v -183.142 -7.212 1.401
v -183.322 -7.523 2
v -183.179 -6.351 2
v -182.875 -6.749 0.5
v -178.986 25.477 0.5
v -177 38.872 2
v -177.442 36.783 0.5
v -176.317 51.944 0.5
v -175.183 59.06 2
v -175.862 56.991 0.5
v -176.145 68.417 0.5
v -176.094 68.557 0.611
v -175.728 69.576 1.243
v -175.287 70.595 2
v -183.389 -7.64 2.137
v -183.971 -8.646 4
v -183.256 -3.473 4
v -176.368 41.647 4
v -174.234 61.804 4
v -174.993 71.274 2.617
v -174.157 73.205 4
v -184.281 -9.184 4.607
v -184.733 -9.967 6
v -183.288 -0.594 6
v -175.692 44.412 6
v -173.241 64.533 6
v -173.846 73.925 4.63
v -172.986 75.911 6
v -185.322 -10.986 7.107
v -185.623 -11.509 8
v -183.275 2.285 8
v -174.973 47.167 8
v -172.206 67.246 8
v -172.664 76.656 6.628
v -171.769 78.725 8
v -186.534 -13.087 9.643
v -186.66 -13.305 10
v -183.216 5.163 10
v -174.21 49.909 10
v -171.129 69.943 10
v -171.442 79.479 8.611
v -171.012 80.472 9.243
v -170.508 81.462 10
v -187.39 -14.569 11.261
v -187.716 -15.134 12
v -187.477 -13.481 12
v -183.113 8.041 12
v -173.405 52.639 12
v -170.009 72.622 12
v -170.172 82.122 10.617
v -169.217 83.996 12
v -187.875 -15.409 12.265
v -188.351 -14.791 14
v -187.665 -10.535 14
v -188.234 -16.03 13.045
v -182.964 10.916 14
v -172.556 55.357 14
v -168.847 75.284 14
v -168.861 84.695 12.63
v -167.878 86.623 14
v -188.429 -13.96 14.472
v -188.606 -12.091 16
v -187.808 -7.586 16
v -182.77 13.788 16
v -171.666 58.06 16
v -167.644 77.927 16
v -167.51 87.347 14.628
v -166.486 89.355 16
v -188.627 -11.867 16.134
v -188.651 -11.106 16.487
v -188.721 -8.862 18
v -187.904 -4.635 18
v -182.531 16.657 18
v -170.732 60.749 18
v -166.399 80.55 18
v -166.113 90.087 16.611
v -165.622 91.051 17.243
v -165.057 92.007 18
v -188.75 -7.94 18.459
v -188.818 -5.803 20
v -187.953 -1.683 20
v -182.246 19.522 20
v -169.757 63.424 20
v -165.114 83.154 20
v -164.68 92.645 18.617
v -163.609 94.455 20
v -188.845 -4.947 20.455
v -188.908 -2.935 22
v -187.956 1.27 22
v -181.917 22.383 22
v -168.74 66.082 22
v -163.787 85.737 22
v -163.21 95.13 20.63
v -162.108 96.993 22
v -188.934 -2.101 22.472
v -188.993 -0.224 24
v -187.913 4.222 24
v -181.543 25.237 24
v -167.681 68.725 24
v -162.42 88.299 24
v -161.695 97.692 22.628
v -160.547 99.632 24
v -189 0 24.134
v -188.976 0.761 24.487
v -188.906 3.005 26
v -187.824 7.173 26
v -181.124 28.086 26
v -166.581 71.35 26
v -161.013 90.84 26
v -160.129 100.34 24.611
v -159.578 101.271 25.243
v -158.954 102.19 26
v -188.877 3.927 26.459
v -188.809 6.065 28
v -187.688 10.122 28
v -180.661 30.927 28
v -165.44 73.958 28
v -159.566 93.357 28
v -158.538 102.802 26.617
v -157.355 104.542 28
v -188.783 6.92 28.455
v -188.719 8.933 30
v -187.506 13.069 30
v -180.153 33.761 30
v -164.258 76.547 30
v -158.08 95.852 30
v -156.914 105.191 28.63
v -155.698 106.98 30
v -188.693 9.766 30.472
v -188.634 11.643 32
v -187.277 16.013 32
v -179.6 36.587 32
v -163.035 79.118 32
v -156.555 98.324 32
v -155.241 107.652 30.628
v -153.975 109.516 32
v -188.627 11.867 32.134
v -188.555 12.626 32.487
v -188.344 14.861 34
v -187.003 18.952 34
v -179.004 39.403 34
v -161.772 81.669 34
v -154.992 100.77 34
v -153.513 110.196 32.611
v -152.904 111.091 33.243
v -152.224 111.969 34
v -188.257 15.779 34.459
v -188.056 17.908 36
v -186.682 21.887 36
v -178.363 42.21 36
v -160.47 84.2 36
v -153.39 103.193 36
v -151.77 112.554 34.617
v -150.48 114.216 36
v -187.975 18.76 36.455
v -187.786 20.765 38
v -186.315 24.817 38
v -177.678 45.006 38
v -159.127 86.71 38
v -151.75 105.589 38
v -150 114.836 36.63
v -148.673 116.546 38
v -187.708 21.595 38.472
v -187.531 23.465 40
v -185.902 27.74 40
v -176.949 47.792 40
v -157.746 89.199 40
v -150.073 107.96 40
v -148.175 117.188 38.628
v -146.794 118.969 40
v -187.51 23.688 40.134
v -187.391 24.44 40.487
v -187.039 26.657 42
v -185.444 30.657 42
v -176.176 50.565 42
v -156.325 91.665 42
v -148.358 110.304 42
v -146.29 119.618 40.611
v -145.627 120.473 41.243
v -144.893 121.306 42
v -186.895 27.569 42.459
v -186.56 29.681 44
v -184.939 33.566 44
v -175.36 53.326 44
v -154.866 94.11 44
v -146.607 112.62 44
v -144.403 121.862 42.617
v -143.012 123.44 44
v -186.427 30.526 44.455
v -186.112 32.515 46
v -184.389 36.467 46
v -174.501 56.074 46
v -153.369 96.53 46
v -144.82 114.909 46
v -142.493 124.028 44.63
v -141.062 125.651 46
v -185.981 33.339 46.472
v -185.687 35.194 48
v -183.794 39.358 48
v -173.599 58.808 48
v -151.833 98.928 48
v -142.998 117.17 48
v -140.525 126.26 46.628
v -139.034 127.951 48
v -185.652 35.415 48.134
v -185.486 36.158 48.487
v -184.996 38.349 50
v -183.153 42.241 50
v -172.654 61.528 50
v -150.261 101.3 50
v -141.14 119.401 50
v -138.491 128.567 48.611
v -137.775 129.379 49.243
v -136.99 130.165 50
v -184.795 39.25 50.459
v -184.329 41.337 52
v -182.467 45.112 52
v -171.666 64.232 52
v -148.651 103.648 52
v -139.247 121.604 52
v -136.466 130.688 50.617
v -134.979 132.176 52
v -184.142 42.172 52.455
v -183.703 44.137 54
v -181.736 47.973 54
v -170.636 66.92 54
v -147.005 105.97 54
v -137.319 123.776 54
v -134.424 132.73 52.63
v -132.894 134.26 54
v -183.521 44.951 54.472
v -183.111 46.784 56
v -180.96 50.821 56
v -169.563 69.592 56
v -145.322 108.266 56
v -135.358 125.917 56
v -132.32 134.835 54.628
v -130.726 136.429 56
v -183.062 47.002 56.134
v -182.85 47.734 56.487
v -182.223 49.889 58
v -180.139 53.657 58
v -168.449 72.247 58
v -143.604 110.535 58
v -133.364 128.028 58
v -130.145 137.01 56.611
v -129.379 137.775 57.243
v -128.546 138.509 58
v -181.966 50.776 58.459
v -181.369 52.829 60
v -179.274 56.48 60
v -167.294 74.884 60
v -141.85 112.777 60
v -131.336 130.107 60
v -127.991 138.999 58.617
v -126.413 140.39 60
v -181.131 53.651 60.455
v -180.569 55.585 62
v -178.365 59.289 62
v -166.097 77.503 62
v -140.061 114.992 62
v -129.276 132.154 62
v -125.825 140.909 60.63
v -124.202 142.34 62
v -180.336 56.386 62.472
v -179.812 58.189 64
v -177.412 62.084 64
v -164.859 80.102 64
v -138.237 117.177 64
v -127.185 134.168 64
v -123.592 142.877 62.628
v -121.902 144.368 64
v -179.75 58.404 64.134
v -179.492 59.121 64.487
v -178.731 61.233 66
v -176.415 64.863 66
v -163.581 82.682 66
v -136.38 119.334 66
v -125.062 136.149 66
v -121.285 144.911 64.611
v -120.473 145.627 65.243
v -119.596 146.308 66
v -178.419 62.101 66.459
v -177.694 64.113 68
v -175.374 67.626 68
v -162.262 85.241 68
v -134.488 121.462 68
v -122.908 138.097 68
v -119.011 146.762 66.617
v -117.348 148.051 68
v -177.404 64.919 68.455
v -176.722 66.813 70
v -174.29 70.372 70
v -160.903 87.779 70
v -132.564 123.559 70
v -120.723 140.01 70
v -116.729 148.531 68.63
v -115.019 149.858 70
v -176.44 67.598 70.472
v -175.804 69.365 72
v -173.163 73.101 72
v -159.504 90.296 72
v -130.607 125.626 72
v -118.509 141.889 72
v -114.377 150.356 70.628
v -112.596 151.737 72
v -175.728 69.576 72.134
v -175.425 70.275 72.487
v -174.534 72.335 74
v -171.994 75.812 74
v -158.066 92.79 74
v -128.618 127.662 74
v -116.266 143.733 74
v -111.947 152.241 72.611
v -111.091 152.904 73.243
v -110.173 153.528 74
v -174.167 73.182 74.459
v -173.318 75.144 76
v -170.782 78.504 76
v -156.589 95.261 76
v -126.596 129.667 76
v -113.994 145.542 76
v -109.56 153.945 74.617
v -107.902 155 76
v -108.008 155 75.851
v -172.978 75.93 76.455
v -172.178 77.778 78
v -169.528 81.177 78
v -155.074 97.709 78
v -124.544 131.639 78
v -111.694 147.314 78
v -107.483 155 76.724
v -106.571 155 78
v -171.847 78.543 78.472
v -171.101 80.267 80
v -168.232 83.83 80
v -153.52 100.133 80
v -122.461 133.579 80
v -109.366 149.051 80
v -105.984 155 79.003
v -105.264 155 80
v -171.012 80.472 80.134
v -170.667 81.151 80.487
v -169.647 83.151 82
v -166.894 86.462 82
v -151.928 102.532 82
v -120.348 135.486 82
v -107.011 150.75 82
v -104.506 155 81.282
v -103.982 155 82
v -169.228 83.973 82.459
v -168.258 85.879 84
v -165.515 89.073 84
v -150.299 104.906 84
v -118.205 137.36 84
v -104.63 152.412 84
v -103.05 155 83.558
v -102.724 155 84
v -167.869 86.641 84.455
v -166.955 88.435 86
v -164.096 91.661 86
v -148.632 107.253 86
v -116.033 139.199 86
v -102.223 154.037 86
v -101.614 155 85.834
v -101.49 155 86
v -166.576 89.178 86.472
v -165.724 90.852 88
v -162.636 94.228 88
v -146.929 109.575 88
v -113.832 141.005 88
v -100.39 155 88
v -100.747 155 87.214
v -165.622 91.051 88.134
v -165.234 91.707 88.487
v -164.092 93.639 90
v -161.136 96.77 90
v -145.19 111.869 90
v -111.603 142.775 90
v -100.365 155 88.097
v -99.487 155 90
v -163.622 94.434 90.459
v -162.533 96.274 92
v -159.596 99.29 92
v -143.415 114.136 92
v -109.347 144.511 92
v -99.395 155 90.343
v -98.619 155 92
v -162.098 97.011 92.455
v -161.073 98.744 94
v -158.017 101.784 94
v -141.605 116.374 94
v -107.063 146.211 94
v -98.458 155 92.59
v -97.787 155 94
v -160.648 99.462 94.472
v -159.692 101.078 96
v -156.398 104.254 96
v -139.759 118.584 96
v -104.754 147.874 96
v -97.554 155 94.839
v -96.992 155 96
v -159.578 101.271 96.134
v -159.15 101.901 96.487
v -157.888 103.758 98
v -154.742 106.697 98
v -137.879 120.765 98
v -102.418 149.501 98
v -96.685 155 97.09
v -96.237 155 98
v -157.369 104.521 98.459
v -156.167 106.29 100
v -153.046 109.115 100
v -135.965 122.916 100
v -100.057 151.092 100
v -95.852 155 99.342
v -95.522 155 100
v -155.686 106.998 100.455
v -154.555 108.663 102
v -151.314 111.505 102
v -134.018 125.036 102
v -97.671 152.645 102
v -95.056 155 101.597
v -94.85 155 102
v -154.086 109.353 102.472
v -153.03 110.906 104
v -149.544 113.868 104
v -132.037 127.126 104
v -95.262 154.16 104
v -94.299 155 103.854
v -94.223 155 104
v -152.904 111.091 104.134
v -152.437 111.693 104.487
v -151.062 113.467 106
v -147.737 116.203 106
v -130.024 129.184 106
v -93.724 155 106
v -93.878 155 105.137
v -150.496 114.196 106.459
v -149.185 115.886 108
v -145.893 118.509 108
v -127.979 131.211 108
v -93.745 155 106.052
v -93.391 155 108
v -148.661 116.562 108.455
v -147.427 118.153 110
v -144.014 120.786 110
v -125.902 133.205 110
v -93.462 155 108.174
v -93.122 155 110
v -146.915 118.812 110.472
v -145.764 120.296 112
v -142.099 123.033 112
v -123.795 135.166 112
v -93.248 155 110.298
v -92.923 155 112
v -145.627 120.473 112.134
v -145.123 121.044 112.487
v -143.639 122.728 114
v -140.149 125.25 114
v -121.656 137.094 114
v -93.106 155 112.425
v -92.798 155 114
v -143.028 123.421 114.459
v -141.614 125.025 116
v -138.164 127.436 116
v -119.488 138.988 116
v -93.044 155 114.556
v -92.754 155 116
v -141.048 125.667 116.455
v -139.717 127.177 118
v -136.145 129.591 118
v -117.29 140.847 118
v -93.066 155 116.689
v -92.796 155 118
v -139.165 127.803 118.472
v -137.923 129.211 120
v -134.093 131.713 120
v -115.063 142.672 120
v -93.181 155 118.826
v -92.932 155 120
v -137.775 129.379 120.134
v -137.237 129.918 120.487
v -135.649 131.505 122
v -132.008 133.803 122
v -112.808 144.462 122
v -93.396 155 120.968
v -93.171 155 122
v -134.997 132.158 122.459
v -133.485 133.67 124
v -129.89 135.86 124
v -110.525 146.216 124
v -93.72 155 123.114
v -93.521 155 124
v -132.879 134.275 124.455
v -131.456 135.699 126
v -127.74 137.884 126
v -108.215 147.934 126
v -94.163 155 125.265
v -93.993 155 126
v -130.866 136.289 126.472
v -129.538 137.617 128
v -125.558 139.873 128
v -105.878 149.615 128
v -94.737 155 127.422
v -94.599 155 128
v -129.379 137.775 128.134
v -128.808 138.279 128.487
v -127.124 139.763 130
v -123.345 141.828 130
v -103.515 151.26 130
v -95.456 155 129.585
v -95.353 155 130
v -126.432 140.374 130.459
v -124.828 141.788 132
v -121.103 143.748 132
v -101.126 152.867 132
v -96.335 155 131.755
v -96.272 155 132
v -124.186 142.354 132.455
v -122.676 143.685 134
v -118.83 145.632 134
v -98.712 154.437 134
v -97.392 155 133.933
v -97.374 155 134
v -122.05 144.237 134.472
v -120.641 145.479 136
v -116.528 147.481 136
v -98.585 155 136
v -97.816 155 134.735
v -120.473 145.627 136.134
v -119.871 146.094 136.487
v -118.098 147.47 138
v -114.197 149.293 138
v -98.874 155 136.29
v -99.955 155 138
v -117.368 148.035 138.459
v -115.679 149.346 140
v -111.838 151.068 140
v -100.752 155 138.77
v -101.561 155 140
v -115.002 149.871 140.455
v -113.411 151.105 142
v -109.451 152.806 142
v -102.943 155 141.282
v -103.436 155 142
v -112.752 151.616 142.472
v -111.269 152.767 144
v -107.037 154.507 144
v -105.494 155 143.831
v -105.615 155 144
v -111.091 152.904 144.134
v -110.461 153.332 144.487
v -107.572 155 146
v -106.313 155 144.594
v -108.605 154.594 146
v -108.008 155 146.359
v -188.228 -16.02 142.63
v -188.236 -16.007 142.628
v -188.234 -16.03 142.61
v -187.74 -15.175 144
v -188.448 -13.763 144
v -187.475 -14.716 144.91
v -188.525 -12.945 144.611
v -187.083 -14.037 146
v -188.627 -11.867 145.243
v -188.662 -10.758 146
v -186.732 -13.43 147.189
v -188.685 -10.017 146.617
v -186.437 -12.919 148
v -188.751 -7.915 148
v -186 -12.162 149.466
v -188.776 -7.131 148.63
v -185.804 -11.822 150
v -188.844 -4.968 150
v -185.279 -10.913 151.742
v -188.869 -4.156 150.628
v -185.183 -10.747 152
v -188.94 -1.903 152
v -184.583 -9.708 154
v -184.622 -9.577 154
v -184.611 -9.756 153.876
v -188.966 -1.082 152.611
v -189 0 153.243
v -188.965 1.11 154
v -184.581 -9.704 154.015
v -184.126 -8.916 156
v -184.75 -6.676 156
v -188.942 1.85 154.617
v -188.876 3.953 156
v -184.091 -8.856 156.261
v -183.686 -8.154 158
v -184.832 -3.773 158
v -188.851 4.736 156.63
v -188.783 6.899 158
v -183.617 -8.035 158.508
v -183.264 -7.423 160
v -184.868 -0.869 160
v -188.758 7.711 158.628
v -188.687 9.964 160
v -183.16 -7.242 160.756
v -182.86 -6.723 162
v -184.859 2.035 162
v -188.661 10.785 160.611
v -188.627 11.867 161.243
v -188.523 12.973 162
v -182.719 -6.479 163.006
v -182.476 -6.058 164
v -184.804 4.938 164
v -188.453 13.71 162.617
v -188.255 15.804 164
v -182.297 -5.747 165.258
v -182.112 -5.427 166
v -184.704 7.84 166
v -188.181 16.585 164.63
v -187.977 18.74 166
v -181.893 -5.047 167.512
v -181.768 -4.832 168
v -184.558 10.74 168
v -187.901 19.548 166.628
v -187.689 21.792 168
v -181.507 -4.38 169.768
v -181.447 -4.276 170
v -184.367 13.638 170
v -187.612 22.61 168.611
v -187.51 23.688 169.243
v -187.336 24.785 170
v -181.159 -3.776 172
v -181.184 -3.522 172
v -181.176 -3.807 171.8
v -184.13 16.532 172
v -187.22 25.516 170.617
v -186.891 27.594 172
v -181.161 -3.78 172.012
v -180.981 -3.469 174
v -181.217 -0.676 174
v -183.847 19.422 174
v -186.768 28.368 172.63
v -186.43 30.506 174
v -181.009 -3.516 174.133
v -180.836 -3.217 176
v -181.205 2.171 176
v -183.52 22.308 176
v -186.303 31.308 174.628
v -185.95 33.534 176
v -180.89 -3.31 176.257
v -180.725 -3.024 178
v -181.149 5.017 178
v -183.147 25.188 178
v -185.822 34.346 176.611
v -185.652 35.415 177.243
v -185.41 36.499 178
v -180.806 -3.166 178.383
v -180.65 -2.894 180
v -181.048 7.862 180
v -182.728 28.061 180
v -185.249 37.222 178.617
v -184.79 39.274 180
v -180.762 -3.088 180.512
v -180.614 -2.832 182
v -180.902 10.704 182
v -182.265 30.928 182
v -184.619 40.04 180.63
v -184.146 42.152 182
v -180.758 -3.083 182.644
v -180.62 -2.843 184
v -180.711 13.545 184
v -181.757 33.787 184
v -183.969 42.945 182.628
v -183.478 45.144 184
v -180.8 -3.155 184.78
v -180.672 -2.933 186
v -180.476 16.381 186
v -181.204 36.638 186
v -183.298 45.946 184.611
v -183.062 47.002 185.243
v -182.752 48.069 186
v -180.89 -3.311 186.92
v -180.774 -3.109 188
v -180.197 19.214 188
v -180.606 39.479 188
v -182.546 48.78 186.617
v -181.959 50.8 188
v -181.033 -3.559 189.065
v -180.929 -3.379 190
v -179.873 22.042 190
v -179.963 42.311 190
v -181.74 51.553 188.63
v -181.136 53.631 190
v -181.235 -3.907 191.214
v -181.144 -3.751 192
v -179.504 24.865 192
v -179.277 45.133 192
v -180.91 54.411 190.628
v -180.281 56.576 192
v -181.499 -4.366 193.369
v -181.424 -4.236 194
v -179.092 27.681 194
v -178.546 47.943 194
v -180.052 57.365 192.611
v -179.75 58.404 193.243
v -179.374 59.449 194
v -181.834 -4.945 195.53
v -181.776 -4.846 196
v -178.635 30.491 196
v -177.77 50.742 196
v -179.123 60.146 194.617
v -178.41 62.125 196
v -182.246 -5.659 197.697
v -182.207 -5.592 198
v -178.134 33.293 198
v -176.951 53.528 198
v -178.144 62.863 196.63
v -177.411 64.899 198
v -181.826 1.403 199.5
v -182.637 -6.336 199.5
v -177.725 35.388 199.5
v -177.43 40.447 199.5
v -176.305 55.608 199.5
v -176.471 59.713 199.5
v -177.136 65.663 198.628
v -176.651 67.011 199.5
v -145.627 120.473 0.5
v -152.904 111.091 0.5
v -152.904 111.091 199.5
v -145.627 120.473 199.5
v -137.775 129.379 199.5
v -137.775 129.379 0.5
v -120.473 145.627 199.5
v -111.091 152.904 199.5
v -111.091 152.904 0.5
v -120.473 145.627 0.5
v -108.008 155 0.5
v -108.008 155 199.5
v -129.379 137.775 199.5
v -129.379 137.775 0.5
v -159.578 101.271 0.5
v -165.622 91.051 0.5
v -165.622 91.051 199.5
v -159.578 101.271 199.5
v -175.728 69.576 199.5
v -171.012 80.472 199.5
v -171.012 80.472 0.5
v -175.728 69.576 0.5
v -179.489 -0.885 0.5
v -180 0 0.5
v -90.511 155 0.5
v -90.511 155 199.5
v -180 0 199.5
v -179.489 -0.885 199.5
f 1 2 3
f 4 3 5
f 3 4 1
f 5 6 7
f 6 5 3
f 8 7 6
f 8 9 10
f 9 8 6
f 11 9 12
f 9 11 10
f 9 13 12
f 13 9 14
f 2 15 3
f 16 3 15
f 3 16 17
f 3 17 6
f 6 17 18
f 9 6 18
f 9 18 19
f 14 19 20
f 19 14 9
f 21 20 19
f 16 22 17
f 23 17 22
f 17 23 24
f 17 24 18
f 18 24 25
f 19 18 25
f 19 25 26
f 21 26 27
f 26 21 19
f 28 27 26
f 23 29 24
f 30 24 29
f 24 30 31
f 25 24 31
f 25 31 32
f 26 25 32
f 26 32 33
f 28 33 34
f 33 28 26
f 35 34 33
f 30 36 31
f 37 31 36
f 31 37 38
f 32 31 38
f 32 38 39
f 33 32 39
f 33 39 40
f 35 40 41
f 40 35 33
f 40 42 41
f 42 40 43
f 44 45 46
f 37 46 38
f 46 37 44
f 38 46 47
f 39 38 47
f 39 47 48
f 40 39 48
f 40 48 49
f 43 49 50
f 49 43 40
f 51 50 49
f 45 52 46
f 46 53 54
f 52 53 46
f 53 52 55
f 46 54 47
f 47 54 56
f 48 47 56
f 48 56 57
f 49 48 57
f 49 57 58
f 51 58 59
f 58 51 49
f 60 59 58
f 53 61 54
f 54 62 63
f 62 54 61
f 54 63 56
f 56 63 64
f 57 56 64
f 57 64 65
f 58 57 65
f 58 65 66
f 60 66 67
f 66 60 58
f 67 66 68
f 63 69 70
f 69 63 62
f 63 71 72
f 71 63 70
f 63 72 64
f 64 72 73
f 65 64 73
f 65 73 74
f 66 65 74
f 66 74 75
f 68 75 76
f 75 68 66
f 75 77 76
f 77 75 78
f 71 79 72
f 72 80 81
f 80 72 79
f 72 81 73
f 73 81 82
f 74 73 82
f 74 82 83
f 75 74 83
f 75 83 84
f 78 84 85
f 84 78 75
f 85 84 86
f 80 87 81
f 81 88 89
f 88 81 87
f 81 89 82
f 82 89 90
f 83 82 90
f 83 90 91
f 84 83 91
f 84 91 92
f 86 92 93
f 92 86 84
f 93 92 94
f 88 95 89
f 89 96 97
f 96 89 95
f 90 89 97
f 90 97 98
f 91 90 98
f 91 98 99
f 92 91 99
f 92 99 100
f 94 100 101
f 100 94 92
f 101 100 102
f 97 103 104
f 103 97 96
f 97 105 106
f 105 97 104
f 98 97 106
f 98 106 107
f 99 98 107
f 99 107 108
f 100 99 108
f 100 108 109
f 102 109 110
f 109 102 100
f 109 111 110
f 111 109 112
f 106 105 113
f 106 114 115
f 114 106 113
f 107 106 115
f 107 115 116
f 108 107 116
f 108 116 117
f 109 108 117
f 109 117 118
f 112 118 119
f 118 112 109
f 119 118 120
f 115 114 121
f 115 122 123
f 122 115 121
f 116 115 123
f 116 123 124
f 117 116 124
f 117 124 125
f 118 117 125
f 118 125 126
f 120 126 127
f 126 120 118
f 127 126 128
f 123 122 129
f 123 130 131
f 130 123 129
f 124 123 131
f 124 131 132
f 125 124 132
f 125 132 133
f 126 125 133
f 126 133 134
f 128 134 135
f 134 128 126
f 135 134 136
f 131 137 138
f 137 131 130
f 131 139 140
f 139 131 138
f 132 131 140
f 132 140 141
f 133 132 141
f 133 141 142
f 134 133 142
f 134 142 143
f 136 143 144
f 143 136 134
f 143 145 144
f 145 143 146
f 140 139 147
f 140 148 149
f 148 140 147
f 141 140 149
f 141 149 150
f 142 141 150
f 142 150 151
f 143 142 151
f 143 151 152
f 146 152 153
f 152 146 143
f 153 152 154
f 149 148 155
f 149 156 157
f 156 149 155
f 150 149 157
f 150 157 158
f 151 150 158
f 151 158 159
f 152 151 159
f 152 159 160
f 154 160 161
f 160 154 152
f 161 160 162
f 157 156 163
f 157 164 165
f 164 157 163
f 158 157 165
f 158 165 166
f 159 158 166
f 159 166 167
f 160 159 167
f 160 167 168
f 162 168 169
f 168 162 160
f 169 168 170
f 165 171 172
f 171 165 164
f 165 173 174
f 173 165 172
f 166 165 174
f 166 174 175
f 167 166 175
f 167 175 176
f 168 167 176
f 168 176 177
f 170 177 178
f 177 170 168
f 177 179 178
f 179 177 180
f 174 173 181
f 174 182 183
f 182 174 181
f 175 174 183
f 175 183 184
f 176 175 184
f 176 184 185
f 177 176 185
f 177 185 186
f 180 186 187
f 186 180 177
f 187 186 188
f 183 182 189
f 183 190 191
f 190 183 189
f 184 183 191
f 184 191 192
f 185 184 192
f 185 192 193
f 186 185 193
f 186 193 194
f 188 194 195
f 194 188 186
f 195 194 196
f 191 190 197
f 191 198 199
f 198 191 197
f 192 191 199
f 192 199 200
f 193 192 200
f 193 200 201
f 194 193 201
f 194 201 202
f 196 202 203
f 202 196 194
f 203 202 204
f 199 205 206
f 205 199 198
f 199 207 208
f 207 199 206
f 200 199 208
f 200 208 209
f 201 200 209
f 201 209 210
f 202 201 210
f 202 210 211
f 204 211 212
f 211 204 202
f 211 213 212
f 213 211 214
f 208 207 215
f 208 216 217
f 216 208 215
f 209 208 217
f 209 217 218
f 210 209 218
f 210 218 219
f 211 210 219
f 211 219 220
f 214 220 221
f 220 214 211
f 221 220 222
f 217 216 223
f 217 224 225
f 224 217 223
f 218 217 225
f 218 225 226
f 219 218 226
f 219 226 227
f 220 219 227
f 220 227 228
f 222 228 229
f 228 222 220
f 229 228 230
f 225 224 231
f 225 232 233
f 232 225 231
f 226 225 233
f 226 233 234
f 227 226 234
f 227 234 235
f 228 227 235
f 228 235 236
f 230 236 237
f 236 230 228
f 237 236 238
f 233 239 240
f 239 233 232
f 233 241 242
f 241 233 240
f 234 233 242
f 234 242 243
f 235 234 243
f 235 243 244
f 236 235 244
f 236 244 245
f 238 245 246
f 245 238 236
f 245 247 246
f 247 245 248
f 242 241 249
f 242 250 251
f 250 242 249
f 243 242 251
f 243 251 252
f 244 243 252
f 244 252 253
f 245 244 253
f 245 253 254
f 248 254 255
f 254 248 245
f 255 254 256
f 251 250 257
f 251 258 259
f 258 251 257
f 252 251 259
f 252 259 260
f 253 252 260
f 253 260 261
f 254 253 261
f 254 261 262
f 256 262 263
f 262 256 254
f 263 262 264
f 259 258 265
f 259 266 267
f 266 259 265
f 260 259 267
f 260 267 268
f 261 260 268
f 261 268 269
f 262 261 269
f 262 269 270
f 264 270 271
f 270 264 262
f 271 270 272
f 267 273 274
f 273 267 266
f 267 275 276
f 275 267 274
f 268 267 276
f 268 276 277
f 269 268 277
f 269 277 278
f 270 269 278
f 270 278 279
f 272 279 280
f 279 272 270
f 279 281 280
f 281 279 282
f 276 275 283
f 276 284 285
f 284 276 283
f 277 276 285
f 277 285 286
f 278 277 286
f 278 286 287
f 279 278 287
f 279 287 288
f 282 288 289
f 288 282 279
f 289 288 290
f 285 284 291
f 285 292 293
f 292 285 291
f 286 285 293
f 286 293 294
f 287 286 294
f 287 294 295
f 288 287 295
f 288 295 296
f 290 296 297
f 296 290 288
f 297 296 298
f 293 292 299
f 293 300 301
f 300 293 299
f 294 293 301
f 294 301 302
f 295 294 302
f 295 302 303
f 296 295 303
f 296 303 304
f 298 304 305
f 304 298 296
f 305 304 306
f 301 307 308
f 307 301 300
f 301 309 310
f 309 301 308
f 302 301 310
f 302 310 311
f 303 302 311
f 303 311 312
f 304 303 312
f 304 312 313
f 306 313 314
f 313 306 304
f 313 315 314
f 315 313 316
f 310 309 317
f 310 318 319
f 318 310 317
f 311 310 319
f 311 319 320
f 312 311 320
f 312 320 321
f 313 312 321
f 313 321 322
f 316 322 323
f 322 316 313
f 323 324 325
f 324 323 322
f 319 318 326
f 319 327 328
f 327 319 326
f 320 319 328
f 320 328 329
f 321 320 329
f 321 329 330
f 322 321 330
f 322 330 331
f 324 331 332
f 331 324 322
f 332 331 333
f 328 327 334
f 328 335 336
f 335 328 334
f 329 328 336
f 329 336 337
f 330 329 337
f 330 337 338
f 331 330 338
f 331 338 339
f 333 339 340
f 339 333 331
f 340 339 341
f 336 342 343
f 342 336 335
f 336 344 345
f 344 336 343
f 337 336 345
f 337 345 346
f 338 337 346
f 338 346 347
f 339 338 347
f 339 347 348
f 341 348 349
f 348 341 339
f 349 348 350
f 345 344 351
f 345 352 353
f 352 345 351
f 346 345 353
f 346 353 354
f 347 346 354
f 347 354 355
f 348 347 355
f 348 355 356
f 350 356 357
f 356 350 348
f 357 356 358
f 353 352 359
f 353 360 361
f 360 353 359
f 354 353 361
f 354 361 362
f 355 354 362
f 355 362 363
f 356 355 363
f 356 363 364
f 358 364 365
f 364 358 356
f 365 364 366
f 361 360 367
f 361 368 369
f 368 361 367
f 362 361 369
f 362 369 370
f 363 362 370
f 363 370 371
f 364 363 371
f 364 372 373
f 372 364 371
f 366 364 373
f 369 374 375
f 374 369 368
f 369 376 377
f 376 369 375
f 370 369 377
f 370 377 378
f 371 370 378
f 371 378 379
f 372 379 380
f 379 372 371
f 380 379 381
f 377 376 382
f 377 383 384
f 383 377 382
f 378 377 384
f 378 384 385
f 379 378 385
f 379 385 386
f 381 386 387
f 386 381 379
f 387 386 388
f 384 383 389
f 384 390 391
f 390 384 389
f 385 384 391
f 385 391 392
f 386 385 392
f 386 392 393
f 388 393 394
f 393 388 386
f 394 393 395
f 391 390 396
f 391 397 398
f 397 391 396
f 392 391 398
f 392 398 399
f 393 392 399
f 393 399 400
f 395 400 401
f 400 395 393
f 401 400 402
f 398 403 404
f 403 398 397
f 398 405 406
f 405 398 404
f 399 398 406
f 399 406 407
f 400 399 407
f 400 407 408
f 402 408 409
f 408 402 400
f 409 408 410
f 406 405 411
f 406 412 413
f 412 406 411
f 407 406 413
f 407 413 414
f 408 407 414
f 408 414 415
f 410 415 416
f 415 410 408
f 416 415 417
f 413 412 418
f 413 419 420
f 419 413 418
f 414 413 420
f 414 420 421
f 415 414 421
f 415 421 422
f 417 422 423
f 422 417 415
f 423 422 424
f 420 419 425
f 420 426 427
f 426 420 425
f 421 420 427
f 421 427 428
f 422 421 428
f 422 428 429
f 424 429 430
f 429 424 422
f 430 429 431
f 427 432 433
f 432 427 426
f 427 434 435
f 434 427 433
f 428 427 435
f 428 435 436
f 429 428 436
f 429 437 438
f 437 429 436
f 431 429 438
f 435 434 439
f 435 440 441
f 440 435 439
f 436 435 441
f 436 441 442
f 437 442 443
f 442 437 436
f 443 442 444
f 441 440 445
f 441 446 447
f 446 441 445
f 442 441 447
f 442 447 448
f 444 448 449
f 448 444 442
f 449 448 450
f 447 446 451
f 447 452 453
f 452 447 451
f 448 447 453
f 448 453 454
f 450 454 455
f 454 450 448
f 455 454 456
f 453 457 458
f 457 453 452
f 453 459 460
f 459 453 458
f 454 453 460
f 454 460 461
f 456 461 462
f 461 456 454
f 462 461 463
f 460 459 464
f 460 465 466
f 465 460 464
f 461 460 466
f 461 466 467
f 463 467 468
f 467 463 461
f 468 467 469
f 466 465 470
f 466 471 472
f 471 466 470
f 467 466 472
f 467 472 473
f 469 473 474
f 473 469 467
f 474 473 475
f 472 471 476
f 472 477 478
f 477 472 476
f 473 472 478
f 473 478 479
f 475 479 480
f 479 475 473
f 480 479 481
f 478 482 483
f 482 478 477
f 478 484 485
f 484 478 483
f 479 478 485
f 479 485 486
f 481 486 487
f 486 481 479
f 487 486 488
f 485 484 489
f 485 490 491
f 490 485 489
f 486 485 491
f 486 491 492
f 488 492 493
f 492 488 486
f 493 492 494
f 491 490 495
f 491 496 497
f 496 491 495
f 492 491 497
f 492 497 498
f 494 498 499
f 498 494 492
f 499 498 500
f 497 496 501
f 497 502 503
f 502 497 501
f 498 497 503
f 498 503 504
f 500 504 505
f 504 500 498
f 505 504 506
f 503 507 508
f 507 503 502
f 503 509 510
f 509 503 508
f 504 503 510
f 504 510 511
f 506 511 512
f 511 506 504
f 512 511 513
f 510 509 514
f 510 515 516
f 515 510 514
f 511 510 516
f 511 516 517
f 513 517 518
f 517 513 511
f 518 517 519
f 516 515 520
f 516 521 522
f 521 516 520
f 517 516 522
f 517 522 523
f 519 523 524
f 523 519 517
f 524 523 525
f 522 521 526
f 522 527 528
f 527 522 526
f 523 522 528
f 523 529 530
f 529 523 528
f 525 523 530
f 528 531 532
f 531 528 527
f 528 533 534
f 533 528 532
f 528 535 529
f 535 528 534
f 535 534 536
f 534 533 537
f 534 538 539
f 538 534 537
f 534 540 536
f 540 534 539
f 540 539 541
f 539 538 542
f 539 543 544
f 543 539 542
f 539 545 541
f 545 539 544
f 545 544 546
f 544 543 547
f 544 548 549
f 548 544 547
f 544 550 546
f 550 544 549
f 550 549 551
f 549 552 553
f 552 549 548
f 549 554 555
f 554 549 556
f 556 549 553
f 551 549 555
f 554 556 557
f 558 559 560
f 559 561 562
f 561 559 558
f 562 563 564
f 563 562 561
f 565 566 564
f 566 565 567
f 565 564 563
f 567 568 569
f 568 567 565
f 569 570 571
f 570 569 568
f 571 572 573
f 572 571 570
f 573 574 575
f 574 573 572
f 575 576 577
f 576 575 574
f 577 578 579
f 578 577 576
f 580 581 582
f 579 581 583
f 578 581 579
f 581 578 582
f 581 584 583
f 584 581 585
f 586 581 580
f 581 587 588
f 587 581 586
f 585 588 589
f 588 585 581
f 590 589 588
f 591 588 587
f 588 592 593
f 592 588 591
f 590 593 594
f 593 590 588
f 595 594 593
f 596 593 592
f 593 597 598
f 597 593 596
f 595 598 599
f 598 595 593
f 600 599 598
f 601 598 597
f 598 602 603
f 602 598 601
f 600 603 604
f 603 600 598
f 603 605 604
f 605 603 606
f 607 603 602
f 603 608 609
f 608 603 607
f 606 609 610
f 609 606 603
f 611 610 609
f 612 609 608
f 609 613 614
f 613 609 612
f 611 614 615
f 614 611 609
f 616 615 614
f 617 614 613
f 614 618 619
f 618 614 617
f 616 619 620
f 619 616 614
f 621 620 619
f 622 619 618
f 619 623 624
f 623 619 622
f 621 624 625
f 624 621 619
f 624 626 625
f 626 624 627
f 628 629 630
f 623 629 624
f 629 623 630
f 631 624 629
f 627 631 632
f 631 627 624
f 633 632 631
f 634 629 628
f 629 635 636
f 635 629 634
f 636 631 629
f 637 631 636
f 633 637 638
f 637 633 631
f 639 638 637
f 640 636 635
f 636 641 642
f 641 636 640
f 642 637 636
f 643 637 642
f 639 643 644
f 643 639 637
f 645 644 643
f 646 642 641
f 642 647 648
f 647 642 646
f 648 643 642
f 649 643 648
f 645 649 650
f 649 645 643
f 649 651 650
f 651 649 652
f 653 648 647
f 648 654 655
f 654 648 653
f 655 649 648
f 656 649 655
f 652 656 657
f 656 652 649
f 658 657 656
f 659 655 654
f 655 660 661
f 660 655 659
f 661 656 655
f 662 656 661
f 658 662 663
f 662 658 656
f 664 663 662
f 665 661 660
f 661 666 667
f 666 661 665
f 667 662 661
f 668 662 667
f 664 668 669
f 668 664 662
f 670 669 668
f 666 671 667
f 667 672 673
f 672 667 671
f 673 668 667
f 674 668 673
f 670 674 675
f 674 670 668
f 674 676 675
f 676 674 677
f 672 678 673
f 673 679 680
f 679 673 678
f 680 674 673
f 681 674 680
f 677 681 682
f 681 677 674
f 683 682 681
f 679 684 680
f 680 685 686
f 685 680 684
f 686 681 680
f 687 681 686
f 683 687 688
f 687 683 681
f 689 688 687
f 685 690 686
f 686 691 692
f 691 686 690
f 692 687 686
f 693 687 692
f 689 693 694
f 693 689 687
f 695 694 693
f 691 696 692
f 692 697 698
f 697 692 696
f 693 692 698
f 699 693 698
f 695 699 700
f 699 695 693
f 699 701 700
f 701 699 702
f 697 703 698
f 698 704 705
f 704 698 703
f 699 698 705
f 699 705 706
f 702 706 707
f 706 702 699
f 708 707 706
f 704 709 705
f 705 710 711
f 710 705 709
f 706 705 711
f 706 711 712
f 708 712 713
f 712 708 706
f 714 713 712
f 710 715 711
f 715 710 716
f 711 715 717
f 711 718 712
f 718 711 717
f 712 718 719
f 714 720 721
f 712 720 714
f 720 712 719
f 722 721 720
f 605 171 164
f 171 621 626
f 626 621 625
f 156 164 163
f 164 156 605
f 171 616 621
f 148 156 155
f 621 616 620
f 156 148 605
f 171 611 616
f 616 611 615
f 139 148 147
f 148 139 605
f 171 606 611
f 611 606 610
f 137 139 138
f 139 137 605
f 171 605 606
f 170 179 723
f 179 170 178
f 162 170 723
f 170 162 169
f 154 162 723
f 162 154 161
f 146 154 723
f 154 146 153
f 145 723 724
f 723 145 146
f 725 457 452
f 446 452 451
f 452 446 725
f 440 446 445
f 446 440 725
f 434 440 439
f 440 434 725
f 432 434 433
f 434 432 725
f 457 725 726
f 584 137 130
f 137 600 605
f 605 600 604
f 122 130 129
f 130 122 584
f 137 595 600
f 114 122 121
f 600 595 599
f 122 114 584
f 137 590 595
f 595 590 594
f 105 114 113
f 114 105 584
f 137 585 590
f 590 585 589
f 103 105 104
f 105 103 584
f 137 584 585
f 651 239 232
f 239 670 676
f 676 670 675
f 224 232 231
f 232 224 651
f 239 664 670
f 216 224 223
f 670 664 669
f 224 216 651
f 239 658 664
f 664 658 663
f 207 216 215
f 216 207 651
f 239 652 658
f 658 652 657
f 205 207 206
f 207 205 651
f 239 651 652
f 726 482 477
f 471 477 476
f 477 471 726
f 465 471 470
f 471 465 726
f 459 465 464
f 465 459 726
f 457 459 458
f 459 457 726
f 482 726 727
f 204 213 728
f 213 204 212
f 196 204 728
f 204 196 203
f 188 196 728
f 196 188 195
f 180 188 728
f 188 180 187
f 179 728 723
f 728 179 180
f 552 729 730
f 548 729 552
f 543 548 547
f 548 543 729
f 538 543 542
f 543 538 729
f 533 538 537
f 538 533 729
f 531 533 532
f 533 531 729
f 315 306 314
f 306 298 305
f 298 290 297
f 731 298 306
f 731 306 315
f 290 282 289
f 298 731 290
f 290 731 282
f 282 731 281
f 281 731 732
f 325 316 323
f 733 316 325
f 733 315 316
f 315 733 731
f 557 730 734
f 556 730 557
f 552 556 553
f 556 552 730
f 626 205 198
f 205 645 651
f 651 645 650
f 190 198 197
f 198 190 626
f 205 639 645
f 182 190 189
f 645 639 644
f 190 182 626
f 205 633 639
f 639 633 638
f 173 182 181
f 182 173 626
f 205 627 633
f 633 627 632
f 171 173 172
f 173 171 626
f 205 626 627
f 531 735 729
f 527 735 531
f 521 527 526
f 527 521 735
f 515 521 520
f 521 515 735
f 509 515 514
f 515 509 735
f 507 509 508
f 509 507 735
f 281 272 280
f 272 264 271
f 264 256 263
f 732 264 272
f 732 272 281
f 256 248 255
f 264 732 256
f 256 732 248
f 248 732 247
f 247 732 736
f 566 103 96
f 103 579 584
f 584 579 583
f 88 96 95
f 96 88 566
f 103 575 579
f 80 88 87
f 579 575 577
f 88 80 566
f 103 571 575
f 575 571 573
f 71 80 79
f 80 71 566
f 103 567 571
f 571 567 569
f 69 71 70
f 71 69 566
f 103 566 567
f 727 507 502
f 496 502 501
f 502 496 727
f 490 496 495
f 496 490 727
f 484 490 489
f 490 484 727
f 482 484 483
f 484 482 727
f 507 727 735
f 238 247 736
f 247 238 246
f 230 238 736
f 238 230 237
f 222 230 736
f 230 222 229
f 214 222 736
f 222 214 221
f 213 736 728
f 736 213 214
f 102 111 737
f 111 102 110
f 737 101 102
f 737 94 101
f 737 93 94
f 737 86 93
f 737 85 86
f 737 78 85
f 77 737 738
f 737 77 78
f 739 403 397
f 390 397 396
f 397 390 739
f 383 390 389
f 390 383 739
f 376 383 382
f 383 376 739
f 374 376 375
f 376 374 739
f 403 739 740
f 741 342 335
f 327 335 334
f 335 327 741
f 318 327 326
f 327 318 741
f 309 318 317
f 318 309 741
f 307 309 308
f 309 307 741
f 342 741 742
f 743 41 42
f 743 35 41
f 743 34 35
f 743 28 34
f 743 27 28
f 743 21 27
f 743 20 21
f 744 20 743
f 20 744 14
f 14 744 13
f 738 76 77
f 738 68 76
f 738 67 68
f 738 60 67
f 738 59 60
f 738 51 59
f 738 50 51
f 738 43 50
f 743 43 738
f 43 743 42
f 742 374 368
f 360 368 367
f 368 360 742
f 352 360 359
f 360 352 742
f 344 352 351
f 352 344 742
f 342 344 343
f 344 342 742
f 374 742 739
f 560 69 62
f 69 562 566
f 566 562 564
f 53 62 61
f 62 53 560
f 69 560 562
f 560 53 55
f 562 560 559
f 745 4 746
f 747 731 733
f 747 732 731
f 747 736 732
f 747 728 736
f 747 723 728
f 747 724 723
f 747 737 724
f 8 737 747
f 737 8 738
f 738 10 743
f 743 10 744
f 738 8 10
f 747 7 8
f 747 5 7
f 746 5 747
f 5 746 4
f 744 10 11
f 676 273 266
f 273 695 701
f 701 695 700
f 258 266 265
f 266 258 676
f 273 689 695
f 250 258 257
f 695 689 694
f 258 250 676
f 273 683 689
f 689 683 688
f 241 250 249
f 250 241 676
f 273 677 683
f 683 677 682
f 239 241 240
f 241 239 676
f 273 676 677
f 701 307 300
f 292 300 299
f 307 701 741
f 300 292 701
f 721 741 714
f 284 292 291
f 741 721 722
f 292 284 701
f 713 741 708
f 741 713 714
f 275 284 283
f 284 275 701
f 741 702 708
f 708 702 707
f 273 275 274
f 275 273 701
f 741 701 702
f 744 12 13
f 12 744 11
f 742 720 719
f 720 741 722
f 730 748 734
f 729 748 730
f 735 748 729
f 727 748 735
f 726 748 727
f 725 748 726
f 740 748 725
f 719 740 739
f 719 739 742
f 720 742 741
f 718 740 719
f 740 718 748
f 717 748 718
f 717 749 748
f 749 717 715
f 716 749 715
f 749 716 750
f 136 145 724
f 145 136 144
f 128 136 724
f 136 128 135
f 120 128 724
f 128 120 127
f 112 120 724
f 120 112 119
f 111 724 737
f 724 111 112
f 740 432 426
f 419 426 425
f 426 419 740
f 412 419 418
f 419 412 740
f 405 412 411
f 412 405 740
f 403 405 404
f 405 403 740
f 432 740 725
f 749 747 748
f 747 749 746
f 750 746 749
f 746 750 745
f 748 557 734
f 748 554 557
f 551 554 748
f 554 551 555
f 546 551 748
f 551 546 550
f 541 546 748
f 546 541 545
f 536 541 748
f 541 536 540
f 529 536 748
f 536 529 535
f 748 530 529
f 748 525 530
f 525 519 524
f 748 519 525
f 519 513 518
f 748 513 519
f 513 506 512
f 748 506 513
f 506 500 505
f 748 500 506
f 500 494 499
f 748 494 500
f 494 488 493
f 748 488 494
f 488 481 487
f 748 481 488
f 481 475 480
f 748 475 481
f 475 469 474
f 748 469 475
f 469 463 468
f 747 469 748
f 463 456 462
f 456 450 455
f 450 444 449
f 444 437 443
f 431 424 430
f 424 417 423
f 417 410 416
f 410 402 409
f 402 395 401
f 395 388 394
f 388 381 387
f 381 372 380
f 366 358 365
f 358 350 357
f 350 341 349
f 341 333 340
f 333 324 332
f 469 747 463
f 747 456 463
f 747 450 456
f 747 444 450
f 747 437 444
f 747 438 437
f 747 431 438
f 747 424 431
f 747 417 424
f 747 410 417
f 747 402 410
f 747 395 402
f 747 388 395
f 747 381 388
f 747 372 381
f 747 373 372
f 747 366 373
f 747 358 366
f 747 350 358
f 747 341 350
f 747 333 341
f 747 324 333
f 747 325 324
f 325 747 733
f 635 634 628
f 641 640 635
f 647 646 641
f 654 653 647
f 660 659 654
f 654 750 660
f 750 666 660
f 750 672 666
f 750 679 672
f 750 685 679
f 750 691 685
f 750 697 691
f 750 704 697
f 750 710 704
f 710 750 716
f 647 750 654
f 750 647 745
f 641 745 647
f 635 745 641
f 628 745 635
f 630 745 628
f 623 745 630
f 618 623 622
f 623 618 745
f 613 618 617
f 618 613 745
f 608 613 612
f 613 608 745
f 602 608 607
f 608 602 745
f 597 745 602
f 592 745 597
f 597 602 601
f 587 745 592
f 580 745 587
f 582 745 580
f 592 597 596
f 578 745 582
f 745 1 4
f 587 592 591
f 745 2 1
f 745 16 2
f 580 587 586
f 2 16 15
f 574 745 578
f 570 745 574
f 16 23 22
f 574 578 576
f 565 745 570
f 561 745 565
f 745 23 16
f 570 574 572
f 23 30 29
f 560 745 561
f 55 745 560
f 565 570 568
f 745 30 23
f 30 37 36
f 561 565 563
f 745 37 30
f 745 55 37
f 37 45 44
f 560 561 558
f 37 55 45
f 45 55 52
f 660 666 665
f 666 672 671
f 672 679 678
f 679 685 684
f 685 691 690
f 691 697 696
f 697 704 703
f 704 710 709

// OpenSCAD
intersection() {
difference() {
translate([0,0,100]) {cylinder (r = 189, h = 199, $fn = 100, center = true);}

union() {
linear_extrude(height = 200, twist = 90, $fn = 400) translate([-50,-100,0]){import(file = "wing.dxf", center = false, $fn = 100);} rotate([0,30,0]);

rotate([0,0,90]) {linear_extrude(height = 200, twist = 90, $fn = 400) translate([-50,-100,0]){import(file = "wing.dxf", center = false, $fn = 100);} rotate([0,30,0]);}

rotate([0,0,180]) {linear_extrude(height = 200, twist = 90, $fn = 400) translate([-50,-100,0]){import(file = "wing.dxf", center = false, $fn = 100);} rotate([0,30,0]);}

rotate([0,0,270]) {linear_extrude(height = 200, twist = 90, $fn = 400) translate([-50,-100,0]){import(file = "wing.dxf", center = false, $fn = 100);} rotate([0,30,0]);}
}
cylinder(h = 400, r = 180, center = true, $fn = 6);
translate ([0,175,100]){cube ([400,40,200], center = true);}
}


rotate([0,0,60]) {translate ([0,175,100]){cube ([400,40,200], center = true);}}
}
